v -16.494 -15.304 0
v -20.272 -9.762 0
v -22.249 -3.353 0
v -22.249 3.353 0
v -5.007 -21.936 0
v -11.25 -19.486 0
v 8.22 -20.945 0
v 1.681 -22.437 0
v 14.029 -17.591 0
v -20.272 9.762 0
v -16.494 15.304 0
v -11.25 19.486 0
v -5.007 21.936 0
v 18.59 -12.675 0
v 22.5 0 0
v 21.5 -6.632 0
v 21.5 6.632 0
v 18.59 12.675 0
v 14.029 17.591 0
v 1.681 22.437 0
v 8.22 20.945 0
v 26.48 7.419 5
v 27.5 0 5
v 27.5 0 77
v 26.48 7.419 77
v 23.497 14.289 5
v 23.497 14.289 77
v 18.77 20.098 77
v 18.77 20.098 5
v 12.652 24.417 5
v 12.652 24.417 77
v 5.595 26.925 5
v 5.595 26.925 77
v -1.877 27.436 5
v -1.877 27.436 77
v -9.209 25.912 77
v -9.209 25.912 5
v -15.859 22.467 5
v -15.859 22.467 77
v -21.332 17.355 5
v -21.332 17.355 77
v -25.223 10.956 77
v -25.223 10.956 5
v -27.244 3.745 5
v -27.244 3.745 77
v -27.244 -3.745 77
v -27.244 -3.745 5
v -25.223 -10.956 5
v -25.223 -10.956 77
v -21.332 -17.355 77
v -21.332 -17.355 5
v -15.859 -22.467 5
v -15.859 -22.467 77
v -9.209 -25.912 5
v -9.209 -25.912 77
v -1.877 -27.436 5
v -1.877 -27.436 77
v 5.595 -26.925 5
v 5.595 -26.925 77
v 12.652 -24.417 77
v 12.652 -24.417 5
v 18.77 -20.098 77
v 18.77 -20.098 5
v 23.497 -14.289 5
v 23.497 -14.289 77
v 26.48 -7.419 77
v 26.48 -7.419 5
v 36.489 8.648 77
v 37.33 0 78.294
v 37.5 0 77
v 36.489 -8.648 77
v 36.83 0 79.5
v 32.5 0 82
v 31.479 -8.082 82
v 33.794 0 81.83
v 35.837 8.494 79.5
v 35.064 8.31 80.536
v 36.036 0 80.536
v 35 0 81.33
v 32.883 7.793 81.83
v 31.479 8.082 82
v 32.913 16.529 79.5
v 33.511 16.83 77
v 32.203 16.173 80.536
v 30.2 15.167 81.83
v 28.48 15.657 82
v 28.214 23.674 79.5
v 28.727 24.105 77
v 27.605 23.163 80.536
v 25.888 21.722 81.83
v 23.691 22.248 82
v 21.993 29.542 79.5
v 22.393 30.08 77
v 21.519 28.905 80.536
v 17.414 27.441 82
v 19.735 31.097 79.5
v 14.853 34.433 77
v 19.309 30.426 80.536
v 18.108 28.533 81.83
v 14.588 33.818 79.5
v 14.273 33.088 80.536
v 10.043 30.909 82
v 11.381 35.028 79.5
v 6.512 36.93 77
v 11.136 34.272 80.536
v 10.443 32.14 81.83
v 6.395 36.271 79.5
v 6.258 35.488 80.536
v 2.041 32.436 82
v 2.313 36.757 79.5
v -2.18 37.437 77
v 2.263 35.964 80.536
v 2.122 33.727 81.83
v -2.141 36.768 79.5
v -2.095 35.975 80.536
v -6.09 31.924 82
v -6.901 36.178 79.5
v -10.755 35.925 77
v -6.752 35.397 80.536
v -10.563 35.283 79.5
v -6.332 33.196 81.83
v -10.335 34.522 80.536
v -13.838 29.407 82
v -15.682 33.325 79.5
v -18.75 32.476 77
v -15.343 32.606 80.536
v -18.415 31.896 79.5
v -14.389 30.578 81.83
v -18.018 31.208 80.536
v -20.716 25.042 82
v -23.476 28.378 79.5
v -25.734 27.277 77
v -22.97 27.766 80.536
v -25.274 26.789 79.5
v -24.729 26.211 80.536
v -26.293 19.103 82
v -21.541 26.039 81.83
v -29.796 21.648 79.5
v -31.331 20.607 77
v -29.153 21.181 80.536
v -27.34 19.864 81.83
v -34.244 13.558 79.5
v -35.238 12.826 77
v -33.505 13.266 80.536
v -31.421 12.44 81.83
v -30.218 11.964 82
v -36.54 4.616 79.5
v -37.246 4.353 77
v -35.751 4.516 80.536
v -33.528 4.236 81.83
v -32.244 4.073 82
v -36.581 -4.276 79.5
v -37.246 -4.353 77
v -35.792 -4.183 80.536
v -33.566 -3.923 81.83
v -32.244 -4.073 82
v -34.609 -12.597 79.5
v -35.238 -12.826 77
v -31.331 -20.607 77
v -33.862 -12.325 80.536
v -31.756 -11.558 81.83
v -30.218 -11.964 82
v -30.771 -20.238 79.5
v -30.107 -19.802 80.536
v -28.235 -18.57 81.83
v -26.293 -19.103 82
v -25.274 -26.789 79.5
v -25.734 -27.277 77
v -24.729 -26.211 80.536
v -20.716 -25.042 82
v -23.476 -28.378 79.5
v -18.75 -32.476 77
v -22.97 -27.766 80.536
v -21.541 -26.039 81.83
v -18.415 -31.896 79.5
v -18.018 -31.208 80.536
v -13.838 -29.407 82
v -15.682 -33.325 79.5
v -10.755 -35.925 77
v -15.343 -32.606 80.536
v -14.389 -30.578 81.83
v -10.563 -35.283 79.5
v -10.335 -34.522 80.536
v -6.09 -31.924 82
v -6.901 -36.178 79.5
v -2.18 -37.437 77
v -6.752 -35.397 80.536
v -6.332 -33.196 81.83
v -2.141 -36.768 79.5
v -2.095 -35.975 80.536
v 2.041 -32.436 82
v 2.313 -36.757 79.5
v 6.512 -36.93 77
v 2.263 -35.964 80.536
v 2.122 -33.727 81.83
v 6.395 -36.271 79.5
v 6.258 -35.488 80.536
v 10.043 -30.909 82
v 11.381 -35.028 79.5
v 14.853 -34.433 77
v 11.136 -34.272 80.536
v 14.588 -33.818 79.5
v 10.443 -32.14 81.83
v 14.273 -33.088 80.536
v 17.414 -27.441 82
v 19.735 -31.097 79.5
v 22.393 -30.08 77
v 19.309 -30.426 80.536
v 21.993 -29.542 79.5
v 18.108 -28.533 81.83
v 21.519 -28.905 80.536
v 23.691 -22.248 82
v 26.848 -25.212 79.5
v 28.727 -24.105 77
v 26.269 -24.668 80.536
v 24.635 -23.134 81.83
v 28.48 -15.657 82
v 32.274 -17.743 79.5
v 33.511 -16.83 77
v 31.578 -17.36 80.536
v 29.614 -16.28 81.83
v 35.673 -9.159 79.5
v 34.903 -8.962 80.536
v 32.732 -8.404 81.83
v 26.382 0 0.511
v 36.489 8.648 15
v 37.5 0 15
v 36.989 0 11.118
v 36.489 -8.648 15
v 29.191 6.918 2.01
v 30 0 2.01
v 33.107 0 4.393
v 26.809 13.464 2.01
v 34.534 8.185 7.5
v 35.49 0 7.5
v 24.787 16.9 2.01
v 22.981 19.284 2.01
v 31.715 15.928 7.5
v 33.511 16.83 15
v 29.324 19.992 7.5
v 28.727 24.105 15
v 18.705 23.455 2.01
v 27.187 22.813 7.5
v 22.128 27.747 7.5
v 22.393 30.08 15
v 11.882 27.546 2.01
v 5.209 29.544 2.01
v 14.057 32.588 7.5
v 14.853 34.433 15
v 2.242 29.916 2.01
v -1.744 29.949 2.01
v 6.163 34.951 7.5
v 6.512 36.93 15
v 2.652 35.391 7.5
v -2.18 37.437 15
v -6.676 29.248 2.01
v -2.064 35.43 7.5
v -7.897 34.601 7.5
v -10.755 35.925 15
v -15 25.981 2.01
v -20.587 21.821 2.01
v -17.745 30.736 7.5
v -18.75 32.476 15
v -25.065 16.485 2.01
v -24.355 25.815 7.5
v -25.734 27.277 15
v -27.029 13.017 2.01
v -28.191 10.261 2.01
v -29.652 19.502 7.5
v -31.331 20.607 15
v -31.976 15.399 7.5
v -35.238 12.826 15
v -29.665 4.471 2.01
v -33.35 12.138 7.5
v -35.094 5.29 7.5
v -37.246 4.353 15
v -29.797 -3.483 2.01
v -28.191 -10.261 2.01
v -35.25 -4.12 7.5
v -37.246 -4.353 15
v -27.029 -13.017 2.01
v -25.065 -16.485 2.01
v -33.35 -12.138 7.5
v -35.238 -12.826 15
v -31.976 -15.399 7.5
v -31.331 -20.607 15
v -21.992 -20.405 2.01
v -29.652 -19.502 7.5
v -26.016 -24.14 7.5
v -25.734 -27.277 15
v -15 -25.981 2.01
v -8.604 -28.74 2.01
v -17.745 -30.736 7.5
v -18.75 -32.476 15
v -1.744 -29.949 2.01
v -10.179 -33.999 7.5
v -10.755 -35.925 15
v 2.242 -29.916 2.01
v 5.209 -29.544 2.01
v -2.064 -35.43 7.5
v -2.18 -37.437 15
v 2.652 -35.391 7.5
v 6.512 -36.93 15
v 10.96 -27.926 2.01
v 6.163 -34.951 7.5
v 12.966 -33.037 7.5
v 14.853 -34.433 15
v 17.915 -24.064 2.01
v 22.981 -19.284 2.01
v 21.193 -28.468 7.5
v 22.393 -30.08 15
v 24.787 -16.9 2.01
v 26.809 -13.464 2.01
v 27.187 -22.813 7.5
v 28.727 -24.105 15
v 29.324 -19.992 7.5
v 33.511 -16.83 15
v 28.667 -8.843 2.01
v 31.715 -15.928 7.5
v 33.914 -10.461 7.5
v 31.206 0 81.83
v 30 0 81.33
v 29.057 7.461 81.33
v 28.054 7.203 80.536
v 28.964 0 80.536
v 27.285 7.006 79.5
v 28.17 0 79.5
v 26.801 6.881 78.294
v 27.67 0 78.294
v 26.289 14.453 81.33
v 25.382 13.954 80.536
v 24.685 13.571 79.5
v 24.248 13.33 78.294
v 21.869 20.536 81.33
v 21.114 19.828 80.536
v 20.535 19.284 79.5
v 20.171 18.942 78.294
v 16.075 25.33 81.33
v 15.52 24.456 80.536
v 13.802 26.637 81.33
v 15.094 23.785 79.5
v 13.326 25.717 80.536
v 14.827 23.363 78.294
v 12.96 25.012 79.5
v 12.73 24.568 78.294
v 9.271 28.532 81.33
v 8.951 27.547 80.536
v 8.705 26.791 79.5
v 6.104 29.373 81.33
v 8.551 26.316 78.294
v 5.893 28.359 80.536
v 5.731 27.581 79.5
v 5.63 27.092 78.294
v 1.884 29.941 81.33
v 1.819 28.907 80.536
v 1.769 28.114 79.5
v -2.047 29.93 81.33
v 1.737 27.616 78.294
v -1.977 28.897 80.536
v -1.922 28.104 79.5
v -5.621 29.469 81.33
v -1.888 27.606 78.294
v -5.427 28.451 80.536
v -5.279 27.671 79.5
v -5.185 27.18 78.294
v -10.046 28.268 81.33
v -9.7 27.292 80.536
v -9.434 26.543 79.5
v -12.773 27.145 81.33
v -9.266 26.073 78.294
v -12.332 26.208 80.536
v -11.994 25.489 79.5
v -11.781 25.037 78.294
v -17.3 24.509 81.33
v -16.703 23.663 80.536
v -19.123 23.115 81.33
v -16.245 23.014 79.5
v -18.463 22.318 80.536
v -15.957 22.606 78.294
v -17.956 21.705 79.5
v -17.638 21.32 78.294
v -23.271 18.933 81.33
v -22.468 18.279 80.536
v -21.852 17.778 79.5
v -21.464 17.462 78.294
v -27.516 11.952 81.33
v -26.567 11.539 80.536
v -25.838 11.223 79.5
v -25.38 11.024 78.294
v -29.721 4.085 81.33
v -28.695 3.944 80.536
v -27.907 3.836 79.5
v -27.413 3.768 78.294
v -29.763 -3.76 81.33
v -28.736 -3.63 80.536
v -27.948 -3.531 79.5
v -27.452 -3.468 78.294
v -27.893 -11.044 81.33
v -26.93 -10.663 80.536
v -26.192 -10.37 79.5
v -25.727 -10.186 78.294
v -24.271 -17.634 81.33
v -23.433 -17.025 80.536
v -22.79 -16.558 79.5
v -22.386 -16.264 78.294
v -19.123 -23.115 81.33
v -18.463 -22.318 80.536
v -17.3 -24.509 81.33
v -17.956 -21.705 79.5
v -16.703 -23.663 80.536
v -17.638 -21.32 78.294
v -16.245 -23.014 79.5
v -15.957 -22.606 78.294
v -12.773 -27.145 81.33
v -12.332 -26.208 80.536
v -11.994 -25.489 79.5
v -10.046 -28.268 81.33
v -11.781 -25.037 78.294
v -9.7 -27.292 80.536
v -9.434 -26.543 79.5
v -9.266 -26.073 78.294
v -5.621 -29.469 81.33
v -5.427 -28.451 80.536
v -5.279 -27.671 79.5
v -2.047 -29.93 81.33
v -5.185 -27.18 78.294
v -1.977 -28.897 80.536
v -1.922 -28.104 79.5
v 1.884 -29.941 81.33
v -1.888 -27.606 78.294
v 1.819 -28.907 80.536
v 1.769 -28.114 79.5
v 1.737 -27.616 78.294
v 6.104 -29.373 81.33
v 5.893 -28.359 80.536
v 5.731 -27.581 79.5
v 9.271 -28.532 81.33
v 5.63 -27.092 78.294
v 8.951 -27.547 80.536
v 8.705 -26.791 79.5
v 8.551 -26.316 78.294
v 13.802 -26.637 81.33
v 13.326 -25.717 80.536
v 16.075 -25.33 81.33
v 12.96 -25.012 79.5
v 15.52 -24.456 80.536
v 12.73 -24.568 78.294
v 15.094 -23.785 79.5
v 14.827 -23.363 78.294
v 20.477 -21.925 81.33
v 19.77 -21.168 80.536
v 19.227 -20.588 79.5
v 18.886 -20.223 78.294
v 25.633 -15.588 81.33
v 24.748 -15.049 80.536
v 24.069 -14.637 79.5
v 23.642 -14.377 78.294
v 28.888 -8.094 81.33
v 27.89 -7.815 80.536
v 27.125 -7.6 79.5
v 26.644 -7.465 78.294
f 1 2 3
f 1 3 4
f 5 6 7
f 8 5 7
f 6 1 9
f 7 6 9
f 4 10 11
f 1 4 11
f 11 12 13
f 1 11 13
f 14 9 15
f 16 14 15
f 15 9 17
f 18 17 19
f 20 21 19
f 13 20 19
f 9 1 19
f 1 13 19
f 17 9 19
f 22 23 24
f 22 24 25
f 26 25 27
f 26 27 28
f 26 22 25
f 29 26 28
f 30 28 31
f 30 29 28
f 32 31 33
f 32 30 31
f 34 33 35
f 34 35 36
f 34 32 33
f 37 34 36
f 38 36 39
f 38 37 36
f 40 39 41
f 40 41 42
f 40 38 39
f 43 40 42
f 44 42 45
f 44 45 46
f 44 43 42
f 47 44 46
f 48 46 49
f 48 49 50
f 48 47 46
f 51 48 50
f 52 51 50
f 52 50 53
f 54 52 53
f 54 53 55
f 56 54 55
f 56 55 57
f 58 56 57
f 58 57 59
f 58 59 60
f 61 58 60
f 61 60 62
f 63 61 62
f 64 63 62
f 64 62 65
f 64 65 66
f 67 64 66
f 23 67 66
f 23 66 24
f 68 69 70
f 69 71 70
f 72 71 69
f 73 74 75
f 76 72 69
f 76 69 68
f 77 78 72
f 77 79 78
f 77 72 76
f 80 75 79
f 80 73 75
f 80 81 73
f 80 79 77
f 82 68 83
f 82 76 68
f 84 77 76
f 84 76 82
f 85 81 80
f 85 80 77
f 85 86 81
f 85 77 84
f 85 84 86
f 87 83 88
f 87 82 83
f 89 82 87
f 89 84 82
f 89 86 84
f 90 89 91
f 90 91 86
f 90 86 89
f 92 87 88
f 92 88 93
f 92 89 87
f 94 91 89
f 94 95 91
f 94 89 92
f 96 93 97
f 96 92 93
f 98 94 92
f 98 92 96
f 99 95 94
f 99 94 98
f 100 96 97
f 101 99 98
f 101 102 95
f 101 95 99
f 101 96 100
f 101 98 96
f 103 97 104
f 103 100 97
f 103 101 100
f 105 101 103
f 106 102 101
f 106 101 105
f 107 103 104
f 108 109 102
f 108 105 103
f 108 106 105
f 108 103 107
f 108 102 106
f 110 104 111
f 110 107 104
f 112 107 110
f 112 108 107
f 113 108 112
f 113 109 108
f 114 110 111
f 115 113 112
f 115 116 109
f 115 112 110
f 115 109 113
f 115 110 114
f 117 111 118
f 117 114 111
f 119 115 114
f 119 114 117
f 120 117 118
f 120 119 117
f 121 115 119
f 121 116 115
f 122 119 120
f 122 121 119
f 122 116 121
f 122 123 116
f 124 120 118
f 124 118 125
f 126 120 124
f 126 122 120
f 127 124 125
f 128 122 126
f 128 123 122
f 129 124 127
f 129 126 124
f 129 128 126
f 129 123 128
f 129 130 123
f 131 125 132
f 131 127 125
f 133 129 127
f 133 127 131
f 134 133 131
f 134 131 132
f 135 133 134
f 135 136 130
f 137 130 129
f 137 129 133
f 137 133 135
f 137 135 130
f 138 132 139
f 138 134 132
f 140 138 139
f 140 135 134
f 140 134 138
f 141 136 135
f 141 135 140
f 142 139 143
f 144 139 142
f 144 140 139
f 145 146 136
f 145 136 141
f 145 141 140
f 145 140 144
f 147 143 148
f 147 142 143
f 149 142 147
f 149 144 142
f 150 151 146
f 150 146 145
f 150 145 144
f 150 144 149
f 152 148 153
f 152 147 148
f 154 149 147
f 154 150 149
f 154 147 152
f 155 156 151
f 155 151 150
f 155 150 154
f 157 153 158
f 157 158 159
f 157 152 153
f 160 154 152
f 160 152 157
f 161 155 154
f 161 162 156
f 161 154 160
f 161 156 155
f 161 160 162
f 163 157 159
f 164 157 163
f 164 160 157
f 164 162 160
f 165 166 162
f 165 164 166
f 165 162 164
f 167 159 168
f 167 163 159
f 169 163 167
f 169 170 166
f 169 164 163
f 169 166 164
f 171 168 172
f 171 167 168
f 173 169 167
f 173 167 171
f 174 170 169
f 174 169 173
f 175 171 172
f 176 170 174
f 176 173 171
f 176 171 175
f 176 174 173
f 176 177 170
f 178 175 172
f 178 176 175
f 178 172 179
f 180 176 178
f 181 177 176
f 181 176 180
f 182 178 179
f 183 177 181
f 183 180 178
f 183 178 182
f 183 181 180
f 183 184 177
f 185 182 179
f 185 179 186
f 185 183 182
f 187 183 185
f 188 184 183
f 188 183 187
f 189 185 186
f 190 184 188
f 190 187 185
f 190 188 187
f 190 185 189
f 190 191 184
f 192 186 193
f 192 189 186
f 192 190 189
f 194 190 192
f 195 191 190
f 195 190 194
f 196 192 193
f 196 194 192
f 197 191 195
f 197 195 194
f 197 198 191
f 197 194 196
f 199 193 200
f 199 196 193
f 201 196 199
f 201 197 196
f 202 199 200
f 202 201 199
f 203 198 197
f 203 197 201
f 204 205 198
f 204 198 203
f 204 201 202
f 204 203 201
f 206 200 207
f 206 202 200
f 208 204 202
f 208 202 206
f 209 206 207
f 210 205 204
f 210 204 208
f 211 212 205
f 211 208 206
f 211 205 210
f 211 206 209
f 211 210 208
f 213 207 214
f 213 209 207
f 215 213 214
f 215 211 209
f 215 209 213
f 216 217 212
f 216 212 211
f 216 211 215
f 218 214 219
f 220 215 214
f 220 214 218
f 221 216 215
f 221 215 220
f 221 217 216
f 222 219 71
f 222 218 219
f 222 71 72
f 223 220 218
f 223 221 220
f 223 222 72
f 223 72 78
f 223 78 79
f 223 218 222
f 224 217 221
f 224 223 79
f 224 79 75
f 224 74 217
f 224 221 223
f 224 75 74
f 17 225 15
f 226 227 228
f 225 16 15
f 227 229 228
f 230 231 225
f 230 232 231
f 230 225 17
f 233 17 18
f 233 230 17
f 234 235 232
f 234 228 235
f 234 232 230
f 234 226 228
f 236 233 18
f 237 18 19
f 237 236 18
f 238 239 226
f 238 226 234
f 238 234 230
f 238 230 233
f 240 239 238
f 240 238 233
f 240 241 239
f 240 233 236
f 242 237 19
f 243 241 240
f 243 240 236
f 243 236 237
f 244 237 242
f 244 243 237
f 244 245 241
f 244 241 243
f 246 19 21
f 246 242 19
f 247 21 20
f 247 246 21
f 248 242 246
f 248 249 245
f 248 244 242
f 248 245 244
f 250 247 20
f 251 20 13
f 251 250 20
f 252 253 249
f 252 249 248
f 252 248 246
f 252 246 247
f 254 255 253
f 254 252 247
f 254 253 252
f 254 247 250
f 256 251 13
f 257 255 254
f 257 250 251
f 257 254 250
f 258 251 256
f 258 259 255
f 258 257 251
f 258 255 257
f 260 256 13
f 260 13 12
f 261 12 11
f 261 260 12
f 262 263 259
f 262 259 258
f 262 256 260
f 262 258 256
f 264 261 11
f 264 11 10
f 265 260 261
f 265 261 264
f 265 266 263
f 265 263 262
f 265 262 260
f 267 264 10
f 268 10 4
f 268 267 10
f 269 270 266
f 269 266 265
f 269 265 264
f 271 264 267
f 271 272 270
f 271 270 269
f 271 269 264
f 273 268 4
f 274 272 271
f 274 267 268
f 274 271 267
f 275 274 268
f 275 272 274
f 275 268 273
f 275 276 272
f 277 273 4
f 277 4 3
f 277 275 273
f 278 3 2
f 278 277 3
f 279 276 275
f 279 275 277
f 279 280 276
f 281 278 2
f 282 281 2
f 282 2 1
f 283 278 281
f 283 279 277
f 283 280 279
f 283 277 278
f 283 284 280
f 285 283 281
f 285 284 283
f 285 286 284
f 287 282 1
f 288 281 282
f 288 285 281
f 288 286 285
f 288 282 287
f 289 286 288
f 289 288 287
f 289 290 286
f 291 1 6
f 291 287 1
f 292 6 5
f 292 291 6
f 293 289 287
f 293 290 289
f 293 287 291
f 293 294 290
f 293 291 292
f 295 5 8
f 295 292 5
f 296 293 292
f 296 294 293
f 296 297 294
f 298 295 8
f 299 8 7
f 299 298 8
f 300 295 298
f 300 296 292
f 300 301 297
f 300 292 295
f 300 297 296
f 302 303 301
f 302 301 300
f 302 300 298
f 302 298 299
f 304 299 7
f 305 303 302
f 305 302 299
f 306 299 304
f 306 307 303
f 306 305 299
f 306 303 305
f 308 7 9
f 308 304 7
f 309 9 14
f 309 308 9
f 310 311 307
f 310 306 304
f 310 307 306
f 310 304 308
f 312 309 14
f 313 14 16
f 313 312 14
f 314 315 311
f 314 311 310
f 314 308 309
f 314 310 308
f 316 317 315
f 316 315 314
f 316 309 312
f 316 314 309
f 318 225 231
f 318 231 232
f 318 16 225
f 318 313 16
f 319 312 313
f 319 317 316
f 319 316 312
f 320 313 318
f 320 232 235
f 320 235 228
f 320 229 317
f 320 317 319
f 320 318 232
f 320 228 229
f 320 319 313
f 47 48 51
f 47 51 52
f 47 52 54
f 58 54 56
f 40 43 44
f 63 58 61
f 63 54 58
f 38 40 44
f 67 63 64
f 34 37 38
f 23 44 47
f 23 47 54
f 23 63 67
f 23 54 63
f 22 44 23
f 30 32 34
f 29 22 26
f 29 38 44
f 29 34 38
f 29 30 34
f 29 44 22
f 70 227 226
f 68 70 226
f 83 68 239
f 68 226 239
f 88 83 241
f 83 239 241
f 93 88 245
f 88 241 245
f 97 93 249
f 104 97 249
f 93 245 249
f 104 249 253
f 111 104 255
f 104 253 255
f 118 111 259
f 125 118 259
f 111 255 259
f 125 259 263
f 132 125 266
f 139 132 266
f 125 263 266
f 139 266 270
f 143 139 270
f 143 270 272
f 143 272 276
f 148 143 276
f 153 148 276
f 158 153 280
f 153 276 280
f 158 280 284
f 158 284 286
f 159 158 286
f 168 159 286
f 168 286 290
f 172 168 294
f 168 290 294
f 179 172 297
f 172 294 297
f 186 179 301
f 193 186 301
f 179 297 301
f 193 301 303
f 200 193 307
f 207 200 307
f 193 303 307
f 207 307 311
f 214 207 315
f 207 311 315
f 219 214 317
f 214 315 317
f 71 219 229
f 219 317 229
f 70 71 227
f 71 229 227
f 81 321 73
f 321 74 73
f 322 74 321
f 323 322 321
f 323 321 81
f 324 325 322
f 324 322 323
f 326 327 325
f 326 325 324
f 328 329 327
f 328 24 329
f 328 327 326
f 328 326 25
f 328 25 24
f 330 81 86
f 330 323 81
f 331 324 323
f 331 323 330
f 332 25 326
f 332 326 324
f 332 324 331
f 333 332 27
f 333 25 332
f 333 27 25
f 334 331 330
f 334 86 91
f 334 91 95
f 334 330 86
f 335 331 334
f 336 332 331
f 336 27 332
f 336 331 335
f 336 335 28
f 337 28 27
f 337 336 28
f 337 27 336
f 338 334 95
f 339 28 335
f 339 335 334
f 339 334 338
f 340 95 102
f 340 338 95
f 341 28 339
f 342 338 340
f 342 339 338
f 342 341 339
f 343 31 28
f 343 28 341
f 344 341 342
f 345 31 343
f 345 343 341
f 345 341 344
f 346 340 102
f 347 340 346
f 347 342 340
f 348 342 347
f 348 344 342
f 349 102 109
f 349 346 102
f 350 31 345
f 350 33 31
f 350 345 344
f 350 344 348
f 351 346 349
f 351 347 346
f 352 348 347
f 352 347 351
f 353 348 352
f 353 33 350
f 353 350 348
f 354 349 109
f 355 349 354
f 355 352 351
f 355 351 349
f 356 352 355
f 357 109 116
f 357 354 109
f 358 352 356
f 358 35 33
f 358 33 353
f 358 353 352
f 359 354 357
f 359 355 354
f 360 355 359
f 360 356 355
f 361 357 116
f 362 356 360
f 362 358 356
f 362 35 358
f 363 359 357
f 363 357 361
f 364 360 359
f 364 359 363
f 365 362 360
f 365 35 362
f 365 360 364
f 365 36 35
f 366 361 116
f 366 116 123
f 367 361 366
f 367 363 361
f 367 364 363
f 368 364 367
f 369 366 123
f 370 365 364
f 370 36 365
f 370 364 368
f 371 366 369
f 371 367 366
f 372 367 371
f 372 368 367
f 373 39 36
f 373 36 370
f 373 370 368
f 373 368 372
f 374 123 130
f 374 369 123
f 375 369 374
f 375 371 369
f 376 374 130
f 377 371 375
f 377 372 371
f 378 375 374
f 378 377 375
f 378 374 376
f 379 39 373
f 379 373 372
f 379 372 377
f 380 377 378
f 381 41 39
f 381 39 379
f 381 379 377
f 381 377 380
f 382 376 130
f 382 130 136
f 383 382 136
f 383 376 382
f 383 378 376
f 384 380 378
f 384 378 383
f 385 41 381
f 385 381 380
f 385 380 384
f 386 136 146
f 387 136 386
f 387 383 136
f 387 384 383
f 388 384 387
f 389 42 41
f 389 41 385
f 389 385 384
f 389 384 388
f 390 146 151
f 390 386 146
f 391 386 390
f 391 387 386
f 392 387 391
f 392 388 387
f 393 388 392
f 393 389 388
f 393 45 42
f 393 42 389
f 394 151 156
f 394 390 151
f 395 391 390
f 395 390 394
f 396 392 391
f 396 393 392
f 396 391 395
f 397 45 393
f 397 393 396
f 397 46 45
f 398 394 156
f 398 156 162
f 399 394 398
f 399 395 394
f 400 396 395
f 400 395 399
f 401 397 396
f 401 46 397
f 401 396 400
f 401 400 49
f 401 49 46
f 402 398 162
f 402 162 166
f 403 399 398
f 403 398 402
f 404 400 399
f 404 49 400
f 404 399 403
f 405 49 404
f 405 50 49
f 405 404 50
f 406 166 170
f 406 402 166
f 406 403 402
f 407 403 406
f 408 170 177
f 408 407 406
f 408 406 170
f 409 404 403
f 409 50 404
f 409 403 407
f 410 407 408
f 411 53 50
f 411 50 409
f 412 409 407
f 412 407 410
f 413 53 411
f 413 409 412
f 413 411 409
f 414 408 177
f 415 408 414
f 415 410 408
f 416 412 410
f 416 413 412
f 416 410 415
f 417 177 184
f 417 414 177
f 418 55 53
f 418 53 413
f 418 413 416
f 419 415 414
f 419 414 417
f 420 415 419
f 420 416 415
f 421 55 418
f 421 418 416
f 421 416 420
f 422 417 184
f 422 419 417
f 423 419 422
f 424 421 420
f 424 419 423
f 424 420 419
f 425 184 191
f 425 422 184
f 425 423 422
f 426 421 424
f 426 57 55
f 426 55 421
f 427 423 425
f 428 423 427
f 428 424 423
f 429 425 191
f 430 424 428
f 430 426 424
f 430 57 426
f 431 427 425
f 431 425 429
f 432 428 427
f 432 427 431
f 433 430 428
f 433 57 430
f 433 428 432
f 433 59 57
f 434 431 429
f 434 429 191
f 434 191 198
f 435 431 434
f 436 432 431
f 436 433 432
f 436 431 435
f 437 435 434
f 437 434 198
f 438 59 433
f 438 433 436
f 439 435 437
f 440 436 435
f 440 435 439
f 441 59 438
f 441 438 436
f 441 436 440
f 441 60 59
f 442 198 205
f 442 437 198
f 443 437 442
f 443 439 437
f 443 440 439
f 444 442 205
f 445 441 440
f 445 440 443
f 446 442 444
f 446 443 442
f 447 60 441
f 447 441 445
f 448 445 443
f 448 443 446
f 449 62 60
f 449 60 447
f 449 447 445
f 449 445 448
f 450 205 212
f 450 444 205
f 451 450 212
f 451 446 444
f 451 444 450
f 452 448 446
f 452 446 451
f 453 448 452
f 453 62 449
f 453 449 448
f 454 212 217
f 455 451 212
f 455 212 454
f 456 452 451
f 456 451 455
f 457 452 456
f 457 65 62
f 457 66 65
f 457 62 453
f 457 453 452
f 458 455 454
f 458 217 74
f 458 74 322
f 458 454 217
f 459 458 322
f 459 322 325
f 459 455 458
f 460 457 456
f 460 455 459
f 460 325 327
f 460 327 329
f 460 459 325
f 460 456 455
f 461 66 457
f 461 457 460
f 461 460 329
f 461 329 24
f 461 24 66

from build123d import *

# Parameters (mm, degrees)
F0_R     = 37.5
F0_R_2   = 27.5
F1_DEPTH = 82
F2_DEPTH = 5
F3_R     = 15
F4_R     = 5
F5_R     = 4.99999


# Not quite as in the source:
# - a fillet or chamfer is up to 0.001 mm smaller than in the source, because OpenCascade refuses the exact size


with BuildPart() as f1:
    # F0 (on Top) → F1 (new body)
    with BuildSketch(Plane.XY):
        Circle(F0_R)
        Circle(F0_R_2, mode=Mode.SUBTRACT)
    extrude(amount=F1_DEPTH)

    # F0 (on Top) → F2 (join)
    with BuildSketch(Plane.XY):
        Circle(F0_R_2)
    extrude(amount=F2_DEPTH)

    # F3
    f3_edges = [f1.edges().sort_by_distance(p)[0] for p in [
        (-37.5, 0, 0),
    ]]
    fillet(f3_edges, radius=F3_R)

    # F4
    f4_edges = [f1.edges().sort_by_distance(p)[0] for p in [
        (-37.5, 0, 82),
    ]]
    fillet(f4_edges, radius=F4_R)

    # F5 (radius 5 in the source; OpenCascade refuses exactly that, so slightly less here)
    f5_edges = [f1.edges().sort_by_distance(p)[0] for p in [
        (-27.5, 0, 82),
    ]]
    fillet(f5_edges, radius=F5_R)


solid = f1.part
